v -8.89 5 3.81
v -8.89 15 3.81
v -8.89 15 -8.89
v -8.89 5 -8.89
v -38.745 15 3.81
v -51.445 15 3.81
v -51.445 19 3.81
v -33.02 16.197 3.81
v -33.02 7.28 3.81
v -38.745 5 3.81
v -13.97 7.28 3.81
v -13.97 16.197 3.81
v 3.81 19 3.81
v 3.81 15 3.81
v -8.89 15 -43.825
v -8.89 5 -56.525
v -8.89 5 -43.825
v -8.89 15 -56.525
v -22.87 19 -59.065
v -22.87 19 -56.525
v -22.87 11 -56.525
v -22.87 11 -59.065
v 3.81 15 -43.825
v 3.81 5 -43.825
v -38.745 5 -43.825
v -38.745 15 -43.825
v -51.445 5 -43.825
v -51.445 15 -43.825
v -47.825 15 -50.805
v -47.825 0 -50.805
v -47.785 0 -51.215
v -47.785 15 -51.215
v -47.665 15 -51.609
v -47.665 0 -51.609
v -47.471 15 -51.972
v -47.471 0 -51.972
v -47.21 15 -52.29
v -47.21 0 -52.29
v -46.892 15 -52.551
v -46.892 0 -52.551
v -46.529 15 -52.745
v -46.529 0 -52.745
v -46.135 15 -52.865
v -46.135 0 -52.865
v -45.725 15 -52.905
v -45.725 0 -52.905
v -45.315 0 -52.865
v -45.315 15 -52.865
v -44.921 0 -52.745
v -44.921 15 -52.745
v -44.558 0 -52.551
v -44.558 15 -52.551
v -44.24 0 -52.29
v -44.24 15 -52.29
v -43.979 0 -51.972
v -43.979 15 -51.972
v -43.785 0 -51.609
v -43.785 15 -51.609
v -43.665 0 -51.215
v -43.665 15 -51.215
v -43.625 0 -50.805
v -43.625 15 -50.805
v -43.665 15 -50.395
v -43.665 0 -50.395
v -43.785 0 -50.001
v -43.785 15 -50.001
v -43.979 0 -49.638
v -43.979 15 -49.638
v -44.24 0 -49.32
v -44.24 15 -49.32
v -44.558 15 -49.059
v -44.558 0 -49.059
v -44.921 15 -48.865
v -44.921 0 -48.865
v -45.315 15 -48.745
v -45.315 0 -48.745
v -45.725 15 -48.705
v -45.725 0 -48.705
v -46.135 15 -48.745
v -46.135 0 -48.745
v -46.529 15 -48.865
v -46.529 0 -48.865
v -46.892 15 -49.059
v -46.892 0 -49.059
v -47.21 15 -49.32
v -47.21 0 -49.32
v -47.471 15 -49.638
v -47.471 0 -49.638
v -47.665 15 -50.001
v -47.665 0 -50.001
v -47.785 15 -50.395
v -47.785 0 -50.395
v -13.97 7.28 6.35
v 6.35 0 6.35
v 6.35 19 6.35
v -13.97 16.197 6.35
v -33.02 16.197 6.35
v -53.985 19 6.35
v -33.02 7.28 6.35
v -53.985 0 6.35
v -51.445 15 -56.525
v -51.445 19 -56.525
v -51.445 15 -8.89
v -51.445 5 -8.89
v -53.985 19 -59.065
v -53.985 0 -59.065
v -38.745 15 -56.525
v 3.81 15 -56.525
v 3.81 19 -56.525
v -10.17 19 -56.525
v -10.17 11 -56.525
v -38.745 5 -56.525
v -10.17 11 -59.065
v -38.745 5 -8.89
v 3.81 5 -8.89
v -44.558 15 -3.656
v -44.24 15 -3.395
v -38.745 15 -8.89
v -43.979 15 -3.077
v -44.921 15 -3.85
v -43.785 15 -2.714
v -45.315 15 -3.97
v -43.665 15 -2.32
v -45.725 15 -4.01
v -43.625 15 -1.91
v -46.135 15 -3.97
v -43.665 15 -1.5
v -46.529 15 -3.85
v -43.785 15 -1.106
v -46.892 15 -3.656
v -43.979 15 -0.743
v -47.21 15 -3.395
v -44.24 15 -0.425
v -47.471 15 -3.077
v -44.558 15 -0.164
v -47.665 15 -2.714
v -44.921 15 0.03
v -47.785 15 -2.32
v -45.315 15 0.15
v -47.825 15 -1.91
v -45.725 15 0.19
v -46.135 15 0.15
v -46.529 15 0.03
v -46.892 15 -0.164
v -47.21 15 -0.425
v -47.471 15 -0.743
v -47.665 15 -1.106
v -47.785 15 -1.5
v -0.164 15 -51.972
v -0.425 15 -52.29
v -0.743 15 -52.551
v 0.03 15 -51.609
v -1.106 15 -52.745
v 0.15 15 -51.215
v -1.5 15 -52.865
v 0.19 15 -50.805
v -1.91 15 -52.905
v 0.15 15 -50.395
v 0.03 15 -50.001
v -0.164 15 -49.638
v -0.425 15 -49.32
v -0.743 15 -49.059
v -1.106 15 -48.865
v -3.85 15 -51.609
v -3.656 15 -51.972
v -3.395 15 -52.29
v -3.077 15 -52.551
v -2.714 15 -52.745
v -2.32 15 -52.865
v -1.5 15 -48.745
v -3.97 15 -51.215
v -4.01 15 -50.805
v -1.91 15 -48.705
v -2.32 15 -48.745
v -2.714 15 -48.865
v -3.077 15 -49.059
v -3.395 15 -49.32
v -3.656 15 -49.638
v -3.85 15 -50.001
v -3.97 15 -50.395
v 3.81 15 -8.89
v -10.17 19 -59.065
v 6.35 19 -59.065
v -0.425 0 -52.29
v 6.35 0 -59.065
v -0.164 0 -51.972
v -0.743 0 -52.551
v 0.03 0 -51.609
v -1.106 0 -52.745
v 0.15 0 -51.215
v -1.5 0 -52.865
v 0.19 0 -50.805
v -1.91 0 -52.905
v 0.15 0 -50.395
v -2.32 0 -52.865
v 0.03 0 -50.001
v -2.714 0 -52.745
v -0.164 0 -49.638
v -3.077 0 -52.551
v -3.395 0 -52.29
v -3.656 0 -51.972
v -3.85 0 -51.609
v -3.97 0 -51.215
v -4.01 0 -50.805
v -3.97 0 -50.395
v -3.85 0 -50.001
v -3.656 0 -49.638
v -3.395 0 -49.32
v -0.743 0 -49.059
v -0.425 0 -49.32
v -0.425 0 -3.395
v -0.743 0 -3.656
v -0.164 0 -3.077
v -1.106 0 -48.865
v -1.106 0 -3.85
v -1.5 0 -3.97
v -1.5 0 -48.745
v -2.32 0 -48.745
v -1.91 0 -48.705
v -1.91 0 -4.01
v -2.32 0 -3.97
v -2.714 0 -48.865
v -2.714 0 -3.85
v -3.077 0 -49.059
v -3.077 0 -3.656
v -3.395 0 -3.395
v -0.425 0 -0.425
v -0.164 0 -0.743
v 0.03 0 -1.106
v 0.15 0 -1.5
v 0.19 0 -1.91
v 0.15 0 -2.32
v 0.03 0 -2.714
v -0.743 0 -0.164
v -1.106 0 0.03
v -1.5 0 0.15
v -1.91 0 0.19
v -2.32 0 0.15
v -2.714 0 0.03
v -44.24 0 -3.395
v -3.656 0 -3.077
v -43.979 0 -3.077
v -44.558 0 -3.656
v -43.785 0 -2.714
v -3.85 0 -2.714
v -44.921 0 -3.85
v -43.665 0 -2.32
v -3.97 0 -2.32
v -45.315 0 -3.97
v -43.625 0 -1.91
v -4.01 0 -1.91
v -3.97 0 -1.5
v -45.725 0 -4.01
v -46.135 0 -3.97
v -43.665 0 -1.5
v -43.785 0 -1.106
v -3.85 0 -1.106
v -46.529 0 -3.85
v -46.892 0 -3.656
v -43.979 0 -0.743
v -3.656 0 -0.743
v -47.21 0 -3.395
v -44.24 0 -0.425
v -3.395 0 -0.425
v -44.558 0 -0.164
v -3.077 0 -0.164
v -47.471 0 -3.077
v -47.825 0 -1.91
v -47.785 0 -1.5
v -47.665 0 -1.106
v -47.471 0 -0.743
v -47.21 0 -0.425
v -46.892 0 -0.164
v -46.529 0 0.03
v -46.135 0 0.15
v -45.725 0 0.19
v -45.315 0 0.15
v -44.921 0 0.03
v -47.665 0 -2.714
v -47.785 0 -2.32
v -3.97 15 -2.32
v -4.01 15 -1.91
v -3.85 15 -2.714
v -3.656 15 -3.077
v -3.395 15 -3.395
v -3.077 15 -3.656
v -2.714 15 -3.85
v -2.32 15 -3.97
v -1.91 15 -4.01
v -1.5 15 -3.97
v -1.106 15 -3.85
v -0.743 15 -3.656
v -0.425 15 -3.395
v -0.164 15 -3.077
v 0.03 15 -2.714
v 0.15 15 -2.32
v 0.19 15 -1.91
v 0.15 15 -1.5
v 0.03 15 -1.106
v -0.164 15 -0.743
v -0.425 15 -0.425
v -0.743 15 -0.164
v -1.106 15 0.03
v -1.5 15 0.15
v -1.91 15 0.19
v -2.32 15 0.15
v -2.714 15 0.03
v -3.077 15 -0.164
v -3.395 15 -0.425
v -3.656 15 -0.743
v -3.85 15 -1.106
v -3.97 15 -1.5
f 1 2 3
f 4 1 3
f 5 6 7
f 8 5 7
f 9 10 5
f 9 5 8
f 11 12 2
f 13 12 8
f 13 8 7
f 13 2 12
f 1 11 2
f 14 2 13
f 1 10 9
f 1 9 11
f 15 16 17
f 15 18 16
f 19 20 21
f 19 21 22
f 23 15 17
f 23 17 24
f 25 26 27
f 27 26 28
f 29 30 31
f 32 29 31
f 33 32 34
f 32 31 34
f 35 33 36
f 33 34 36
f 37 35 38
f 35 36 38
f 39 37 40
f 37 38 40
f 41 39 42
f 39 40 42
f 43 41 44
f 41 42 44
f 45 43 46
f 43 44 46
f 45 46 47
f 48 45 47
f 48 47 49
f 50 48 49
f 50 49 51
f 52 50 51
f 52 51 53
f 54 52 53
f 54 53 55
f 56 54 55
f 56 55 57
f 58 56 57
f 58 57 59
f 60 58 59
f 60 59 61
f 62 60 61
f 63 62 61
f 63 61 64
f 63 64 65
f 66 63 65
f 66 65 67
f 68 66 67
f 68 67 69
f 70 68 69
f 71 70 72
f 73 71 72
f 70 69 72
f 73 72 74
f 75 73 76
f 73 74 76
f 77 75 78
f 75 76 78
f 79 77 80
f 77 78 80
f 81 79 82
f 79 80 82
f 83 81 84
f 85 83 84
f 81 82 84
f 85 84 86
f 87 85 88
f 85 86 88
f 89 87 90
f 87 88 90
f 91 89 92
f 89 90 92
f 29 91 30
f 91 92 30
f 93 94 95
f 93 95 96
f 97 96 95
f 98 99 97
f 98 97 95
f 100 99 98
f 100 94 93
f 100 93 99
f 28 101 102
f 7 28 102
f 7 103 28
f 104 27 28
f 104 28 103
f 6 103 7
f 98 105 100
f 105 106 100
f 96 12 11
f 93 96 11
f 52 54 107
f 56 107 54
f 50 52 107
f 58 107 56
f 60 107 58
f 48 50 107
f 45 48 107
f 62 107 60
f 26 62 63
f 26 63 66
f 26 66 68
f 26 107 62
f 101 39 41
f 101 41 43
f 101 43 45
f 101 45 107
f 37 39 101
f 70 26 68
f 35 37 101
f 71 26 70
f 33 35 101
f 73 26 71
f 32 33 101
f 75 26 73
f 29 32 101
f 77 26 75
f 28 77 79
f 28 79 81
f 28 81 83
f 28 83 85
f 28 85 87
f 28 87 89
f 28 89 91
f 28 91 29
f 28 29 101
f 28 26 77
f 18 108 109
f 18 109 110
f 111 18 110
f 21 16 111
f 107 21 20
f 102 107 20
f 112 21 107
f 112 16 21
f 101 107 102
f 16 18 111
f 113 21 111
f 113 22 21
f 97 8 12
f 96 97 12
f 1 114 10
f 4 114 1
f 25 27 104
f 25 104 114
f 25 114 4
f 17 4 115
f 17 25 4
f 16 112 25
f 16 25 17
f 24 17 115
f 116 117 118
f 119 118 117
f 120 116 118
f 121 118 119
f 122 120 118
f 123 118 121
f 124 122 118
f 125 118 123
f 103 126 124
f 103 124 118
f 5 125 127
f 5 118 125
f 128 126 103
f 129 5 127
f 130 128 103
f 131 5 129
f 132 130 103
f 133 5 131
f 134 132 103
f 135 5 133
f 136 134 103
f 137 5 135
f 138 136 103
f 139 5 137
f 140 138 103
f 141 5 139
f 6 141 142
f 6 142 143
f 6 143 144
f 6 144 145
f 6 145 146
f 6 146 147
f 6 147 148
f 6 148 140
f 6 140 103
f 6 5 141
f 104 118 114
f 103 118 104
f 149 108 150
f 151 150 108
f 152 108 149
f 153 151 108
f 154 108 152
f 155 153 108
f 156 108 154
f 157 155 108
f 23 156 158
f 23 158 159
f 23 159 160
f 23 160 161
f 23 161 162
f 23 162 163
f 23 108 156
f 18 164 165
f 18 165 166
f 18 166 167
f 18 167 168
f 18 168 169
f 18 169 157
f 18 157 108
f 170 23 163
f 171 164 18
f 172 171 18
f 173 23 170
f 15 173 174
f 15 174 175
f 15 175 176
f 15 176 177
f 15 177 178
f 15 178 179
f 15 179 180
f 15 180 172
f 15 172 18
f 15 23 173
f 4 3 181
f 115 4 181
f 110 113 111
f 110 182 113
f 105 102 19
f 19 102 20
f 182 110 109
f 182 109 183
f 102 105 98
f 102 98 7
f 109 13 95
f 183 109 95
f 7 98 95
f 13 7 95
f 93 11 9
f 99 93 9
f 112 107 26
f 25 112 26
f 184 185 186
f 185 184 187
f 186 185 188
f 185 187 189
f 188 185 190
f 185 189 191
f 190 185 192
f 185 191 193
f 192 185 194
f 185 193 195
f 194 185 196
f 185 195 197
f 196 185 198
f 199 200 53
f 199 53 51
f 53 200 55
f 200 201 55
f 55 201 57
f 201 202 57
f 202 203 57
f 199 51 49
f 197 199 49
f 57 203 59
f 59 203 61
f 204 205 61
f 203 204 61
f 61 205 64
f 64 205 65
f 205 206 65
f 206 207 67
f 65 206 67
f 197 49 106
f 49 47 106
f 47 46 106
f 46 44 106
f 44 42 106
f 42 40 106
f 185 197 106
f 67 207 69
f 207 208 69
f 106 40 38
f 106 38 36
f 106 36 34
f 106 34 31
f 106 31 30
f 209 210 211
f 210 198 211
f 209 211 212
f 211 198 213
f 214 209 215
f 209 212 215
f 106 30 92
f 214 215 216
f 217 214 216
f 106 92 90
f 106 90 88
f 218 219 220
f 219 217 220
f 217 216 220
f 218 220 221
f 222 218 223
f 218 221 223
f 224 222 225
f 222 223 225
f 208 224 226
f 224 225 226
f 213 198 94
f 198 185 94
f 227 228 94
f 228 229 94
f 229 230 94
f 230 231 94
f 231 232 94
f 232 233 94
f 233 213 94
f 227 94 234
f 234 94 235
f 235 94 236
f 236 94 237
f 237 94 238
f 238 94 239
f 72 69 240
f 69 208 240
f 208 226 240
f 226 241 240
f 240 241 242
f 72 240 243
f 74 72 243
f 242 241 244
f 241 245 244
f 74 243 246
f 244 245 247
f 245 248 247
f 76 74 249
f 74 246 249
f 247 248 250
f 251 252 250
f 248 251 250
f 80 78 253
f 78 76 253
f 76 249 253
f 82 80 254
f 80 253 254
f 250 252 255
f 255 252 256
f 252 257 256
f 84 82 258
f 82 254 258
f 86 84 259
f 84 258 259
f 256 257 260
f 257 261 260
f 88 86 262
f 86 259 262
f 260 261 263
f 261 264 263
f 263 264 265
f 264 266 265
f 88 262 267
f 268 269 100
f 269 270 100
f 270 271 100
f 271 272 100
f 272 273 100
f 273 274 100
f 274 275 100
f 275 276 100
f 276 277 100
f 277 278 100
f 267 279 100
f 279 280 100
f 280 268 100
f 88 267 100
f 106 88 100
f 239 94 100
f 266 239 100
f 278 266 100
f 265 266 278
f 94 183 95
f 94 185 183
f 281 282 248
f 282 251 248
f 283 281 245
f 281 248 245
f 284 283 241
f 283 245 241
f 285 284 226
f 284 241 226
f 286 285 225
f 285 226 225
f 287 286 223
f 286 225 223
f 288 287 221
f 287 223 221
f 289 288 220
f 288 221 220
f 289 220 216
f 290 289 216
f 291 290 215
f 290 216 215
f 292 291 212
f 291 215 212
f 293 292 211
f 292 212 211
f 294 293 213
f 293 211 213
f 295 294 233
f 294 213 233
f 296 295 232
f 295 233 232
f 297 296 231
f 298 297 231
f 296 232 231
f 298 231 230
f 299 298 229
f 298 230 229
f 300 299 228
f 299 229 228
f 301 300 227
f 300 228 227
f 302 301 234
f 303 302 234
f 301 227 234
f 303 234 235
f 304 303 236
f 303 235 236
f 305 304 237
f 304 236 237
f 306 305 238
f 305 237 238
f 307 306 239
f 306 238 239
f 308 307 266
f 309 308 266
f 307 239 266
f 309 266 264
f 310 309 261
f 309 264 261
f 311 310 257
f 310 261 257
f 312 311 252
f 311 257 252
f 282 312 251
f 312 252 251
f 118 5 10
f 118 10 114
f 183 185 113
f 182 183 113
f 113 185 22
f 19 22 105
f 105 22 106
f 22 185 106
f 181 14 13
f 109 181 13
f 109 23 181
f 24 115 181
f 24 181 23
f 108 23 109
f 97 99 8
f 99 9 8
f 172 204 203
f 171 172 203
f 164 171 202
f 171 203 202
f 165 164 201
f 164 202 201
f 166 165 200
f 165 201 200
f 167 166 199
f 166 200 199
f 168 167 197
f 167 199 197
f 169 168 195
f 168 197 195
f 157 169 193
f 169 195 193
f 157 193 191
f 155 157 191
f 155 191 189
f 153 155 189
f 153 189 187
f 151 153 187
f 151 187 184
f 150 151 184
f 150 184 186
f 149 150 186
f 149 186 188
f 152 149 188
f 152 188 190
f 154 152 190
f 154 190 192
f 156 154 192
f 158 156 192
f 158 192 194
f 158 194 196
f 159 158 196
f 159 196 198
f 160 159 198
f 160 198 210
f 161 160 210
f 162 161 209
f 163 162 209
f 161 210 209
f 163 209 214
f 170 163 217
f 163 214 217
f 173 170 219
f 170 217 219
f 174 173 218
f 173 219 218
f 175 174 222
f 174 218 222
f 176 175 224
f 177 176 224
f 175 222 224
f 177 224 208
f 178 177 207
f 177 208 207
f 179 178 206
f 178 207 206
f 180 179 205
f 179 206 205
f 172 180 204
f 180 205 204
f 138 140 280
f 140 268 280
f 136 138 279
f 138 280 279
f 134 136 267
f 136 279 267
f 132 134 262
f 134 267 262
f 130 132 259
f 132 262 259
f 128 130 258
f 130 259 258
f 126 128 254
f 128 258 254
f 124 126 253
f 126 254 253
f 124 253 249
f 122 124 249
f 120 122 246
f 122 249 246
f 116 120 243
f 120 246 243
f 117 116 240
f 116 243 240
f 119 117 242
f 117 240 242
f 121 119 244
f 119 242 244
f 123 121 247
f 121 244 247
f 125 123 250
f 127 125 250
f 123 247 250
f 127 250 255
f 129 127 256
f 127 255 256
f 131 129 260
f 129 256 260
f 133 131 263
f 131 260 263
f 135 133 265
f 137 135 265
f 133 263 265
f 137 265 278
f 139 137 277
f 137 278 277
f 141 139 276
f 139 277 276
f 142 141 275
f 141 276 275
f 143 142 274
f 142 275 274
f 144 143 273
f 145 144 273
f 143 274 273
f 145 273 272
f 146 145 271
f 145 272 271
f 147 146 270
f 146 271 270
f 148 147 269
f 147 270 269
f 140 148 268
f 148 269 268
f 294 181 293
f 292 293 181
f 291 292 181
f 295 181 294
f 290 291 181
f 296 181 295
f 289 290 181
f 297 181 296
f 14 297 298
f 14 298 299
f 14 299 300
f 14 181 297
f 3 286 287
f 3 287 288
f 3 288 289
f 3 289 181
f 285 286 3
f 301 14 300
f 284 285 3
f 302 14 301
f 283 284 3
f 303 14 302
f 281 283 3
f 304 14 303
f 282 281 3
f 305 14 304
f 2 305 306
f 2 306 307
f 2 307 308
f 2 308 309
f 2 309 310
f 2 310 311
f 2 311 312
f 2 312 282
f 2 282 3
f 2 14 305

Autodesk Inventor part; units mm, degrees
ref_plane "YZ Plane" through (0, 0, 0) normal (1, 0, 0) x (0, 1, 0)
ref_plane "XZ Plane" through (0, 0, 0) normal (0, 1, 0) x (-1, 0, 0)
ref_plane "XY Plane" through (0, 0, 0) normal (0, 0, 1) x (1, 0, 0)
sketch "Sketch1" plane through (0, 0, 0) normal (0, 1, 0) x (-1, 0, 0)
  line L0 (0, 0) -> (47.635, 0)
  line L1 (47.635, 0) -> (47.635, -52.715)
  line L2 (47.635, -52.715) -> (0, -52.715)
  line L3 (0, -52.715) -> (0, 0)
  circle A0 centre (45.725, -1.91) radius 2.1
  circle A1 centre (45.725, -50.805) radius 2.1
  circle A2 centre (1.91, -1.91) radius 2.1
  circle A3 centre (1.91, -50.805) radius 2.1
  line L4 (47.635, 0) -> (51.445, 0)
  line L5 (51.445, 0) -> (51.445, -52.715)
  line L6 (51.445, -52.715) -> (47.635, -52.715)
  line L7 (47.635, -52.715) -> (47.635, 0)
  line L8 (0, 0) -> (-3.81, 0)
  line L9 (-3.81, 0) -> (-3.81, -56.525)
  line L10 (-3.81, -56.525) -> (0, -56.525)
  line L11 (0, -56.525) -> (0, 0)
  line L12 (51.445, -52.715) -> (-6.35, -52.715)
  line L13 (-6.35, -52.715) -> (-6.35, -56.525)
  line L14 (-6.35, -56.525) -> (51.445, -56.525)
  line L15 (51.445, -56.525) -> (51.445, -52.715)
  line L16 (-3.81, 0) -> (51.445, 0)
  line L17 (51.445, 0) -> (51.445, 3.81)
  line L18 (51.445, 3.81) -> (-3.81, 3.81)
  line L19 (-3.81, 3.81) -> (-3.81, 0)
  point P0 (0, -52.715)
  point P1 (0, -51.6779)
  point P2 (0, -49.9321)
  point P3 (0, -2.7829)
  point P4 (0, -1.0371)
  point P5 (-3.81, -77.675)
  point P6 (-3.81, -52.715)
  point P7 (0, -52.715)
  point P8 (1.0371, -52.715)
  point P9 (2.7829, -52.715)
  point P10 (0, -52.715)
  point P11 (0, -56.525)
  point P12 (0, -56.525)
  dimension "d0" = 52.715
  dimension "d1" = 47.635
  dimension "d3" = 4.2
  dimension "d4" = 4.2
  dimension "d6" = 1.91
  dimension "d7" = 1.91
  dimension "d8" = 1.91
  dimension "d9" = 4.2
  dimension "d10" = 4.2
  dimension "d11" = 1.91
  dimension "d12" = 1.91
  dimension "d13" = 1.91
  dimension "d14" = 1.91
  dimension "d15" = 1.91
  dimension "d18" = 3.81
  dimension "d19" = 3.81
  dimension "d20" = 3.81
  dimension "d21" = 3.81
  dimension "d38" = 0
  dimension "d39" = 0
extrude "Extrusion5" add sketch "Sketch1" along normal blind 15 contours L8 L19 L18 L17 L4 L0 A0 A2 | L0 A2 L3 | L3 A2 A3 L12 L9 L8 | L0 A0 L1 A1 L2 A3 L3 A2 | L12 L11 L10 L9 | L3 A3 L2 | L2 A3 A1 L6 L15 L14 L11 | L0 L1 A0 | A0 L1 L4 L5 L6 A1 | L1 L2 A1 picked at (0.2904, -0.2904) picked at (0.2904, -52.4246) picked at (47.3446, -0.2904) picked at (47.3446, -52.4246)
sketch "Sketch6" plane through (0, 15, 0) normal (0, 1, 0) x (1, 0, 0)
  line L0 (-51.445, -3.81) -> (3.81, -3.81) projected
  line L1 (-51.445, -3.81) -> (-38.745, -3.81)
  line L2 (-38.745, -3.81) -> (-38.745, 8.89)
  line L3 (-38.745, 8.89) -> (-51.445, 8.89)
  line L4 (-51.445, 8.89) -> (-51.445, -3.81)
  line L5 (3.81, 56.525) -> (-51.445, 56.525) projected
  line L6 (-51.445, 56.525) -> (-38.745, 56.525)
  line L7 (-38.745, 56.525) -> (-38.745, 43.825)
  line L8 (-38.745, 43.825) -> (-51.445, 43.825)
  line L9 (-51.445, 43.825) -> (-51.445, 56.525)
  line L10 (3.81, -3.81) -> (3.81, 56.525) projected
  line L11 (3.81, 56.525) -> (-8.89, 56.525)
  line L12 (-8.89, 56.525) -> (-8.89, 43.825)
  line L13 (-8.89, 43.825) -> (3.81, 43.825)
  line L14 (3.81, 43.825) -> (3.81, 56.525)
  line L15 (3.81, -3.81) -> (-8.89, -3.81)
  line L16 (-8.89, -3.81) -> (-8.89, 8.89)
  line L17 (-8.89, 8.89) -> (3.81, 8.89)
  line L18 (3.81, 8.89) -> (3.81, -3.81)
  line L19 (3.81, 56.525) -> (-51.445, 56.525) projected
  line L20 (-51.445, 56.525) -> (-51.445, -3.81) projected
  line L21 (-51.445, -3.81) -> (3.81, -3.81) projected
  line L22 (3.81, -3.81) -> (3.81, 56.525) projected
  circle A0 centre (-1.91, 1.91) radius 2.1 projected
  circle A1 centre (-45.725, 1.91) radius 2.1 projected
  circle A2 centre (-45.725, 50.805) radius 2.1 projected
  circle A3 centre (-1.91, 50.805) radius 2.1 projected
  point P0 (0, 0)
  point P1 (3.81, 8.89)
  dimension "d42" = 12.7
  dimension "d43" = 12.7
  dimension "d44" = 12.7
  dimension "d45" = 12.7
  dimension "d46" = 12.7
  dimension "d47" = 12.7
extrude "Extrusion6" cut sketch "Sketch6" against normal blind 10 contours L2 L3 L20 L8 L7 L5 L12 L13 L10 L17 L16 L0
sketch "Sketch7" plane through (0, 0, 0) normal (0, -1, 0) x (1, 0, 0)
  line L0 (3.81, -56.525) -> (-51.445, -56.525) projected
  line L1 (3.81, 3.81) -> (3.81, -56.525) projected
  line L2 (-51.445, 3.81) -> (3.81, 3.81) projected
  line L3 (-51.445, -56.525) -> (-51.445, 3.81) projected
  circle A0 centre (-1.91, -1.91) radius 2.1 projected
  circle A1 centre (-45.725, -1.91) radius 2.1 projected
  circle A2 centre (-45.725, -50.805) radius 2.1 projected
  circle A3 centre (-1.91, -50.805) radius 2.1 projected
  line L4 (-8.89, 3.81) -> (3.81, 3.81) projected
  line L5 (3.81, 3.81) -> (-51.445, 3.81)
  line L6 (-51.445, 3.81) -> (-51.445, 6.35)
  line L7 (-51.445, 6.35) -> (3.81, 6.35)
  line L8 (3.81, 6.35) -> (3.81, 3.81)
  line L9 (-51.445, 6.35) -> (-53.985, 6.35)
  line L10 (-53.985, 6.35) -> (-53.985, -56.525)
  line L11 (-53.985, -56.525) -> (-51.445, -56.525)
  line L12 (-51.445, -56.525) -> (-51.445, 6.35)
  line L13 (-53.985, -56.525) -> (3.81, -56.525)
  line L14 (3.81, -56.525) -> (3.81, -59.065)
  line L15 (3.81, -59.065) -> (-53.985, -59.065)
  line L16 (-53.985, -59.065) -> (-53.985, -56.525)
  line L17 (3.81, -59.065) -> (6.35, -59.065)
  line L18 (6.35, -59.065) -> (6.35, 5.08)
  line L19 (6.35, 5.08) -> (3.81, 5.08)
  line L20 (3.81, 5.08) -> (3.81, -59.065)
  line L21 (6.35, 5.08) -> (3.81, 5.08)
  line L22 (3.81, 5.08) -> (3.81, 6.35)
  line L23 (3.81, 6.35) -> (6.35, 6.35)
  line L24 (6.35, 6.35) -> (6.35, 5.08)
  point P0 (0, 0)
  dimension "d50" = 2.54
  dimension "d51" = 2.54
  dimension "d52" = 2.54
  dimension "d53" = 2.54
extrude "Extrusion7" add sketch "Sketch7" against normal blind 19 contours L14 L15 L16 L11 L0 | L1 L8 L19 L18 L17 L14 | L11 L10 L9 L6 L3 | L2 L6 L7 L8 | L8 L23 L24 L19
sketch "Sketch8" plane through (0, 19, 0) normal (0, 1, 0) x (1, 0, 0)
  line L0 (-53.985, -6.35) -> (6.35, -6.35) projected
  line L1 (6.35, -6.35) -> (6.35, 59.065) projected
  line L2 (6.35, 59.065) -> (-53.985, 59.065) projected
  line L3 (-53.985, 59.065) -> (-53.985, -6.35) projected
  line L4 (3.81, 56.525) -> (3.81, -3.81) projected
  line L5 (3.81, -3.81) -> (-51.445, -3.81) projected
  line L6 (-51.445, -3.81) -> (-51.445, 56.525) projected
  line L7 (-51.445, 56.525) -> (3.81, 56.525) projected
  circle A0 centre (-1.91, 50.805) radius 2.1 projected
  line L8 (-1.91, 50.805) -> (-10.17, 50.805)
  line L9 (-10.17, 50.805) -> (-10.17, 48.127)
  line L10 (-10.17, 48.127) -> (-1.91, 48.127)
  line L11 (-1.91, 48.127) -> (-1.91, 50.805)
  line L12 (6.35, 59.065) -> (-53.985, 59.065) projected
  line L13 (-10.17, 48.127) -> (-22.87, 48.127)
  line L14 (-22.87, 48.127) -> (-22.87, 59.065)
  line L15 (-22.87, 59.065) -> (-10.17, 59.065)
  line L16 (-10.17, 59.065) -> (-10.17, 48.127)
  point P0 (0, 0)
  point P1 (-10.17, 56.525)
  point P2 (-22.87, 56.525)
  dimension "d56" = 8.26
  dimension "d57" = 12.7
extrude "Extrusion8" cut sketch "Sketch8" against normal blind 8 contours L2 L16 L7 L14
sketch "Sketch9" plane through (0, 5, 0) normal (0, 1, 0) x (1, 0, 0)
  point P0 (0, 0)
sketch "Sketch10" plane through (3.81, 19, 3.81) normal (0, 0, -1) x (-1, 0, 0)
  line L0 (36.83, -2.8033) -> (17.78, -2.8033)
  line L1 (17.78, -2.8033) -> (17.78, -11.7199)
  line L2 (17.78, -11.7199) -> (36.83, -11.7199)
  line L3 (36.83, -11.7199) -> (36.83, -2.8033)
  point P0 (3.81, -19)
  point P1 (12.7, -4)
  dimension "d60" = 19.05
  dimension "d61" = 5.08
extrude "Extrusion9" cut sketch "Sketch10" against normal blind 25.4
properties part number "PCB_REMOTE_Holder_tall_"
